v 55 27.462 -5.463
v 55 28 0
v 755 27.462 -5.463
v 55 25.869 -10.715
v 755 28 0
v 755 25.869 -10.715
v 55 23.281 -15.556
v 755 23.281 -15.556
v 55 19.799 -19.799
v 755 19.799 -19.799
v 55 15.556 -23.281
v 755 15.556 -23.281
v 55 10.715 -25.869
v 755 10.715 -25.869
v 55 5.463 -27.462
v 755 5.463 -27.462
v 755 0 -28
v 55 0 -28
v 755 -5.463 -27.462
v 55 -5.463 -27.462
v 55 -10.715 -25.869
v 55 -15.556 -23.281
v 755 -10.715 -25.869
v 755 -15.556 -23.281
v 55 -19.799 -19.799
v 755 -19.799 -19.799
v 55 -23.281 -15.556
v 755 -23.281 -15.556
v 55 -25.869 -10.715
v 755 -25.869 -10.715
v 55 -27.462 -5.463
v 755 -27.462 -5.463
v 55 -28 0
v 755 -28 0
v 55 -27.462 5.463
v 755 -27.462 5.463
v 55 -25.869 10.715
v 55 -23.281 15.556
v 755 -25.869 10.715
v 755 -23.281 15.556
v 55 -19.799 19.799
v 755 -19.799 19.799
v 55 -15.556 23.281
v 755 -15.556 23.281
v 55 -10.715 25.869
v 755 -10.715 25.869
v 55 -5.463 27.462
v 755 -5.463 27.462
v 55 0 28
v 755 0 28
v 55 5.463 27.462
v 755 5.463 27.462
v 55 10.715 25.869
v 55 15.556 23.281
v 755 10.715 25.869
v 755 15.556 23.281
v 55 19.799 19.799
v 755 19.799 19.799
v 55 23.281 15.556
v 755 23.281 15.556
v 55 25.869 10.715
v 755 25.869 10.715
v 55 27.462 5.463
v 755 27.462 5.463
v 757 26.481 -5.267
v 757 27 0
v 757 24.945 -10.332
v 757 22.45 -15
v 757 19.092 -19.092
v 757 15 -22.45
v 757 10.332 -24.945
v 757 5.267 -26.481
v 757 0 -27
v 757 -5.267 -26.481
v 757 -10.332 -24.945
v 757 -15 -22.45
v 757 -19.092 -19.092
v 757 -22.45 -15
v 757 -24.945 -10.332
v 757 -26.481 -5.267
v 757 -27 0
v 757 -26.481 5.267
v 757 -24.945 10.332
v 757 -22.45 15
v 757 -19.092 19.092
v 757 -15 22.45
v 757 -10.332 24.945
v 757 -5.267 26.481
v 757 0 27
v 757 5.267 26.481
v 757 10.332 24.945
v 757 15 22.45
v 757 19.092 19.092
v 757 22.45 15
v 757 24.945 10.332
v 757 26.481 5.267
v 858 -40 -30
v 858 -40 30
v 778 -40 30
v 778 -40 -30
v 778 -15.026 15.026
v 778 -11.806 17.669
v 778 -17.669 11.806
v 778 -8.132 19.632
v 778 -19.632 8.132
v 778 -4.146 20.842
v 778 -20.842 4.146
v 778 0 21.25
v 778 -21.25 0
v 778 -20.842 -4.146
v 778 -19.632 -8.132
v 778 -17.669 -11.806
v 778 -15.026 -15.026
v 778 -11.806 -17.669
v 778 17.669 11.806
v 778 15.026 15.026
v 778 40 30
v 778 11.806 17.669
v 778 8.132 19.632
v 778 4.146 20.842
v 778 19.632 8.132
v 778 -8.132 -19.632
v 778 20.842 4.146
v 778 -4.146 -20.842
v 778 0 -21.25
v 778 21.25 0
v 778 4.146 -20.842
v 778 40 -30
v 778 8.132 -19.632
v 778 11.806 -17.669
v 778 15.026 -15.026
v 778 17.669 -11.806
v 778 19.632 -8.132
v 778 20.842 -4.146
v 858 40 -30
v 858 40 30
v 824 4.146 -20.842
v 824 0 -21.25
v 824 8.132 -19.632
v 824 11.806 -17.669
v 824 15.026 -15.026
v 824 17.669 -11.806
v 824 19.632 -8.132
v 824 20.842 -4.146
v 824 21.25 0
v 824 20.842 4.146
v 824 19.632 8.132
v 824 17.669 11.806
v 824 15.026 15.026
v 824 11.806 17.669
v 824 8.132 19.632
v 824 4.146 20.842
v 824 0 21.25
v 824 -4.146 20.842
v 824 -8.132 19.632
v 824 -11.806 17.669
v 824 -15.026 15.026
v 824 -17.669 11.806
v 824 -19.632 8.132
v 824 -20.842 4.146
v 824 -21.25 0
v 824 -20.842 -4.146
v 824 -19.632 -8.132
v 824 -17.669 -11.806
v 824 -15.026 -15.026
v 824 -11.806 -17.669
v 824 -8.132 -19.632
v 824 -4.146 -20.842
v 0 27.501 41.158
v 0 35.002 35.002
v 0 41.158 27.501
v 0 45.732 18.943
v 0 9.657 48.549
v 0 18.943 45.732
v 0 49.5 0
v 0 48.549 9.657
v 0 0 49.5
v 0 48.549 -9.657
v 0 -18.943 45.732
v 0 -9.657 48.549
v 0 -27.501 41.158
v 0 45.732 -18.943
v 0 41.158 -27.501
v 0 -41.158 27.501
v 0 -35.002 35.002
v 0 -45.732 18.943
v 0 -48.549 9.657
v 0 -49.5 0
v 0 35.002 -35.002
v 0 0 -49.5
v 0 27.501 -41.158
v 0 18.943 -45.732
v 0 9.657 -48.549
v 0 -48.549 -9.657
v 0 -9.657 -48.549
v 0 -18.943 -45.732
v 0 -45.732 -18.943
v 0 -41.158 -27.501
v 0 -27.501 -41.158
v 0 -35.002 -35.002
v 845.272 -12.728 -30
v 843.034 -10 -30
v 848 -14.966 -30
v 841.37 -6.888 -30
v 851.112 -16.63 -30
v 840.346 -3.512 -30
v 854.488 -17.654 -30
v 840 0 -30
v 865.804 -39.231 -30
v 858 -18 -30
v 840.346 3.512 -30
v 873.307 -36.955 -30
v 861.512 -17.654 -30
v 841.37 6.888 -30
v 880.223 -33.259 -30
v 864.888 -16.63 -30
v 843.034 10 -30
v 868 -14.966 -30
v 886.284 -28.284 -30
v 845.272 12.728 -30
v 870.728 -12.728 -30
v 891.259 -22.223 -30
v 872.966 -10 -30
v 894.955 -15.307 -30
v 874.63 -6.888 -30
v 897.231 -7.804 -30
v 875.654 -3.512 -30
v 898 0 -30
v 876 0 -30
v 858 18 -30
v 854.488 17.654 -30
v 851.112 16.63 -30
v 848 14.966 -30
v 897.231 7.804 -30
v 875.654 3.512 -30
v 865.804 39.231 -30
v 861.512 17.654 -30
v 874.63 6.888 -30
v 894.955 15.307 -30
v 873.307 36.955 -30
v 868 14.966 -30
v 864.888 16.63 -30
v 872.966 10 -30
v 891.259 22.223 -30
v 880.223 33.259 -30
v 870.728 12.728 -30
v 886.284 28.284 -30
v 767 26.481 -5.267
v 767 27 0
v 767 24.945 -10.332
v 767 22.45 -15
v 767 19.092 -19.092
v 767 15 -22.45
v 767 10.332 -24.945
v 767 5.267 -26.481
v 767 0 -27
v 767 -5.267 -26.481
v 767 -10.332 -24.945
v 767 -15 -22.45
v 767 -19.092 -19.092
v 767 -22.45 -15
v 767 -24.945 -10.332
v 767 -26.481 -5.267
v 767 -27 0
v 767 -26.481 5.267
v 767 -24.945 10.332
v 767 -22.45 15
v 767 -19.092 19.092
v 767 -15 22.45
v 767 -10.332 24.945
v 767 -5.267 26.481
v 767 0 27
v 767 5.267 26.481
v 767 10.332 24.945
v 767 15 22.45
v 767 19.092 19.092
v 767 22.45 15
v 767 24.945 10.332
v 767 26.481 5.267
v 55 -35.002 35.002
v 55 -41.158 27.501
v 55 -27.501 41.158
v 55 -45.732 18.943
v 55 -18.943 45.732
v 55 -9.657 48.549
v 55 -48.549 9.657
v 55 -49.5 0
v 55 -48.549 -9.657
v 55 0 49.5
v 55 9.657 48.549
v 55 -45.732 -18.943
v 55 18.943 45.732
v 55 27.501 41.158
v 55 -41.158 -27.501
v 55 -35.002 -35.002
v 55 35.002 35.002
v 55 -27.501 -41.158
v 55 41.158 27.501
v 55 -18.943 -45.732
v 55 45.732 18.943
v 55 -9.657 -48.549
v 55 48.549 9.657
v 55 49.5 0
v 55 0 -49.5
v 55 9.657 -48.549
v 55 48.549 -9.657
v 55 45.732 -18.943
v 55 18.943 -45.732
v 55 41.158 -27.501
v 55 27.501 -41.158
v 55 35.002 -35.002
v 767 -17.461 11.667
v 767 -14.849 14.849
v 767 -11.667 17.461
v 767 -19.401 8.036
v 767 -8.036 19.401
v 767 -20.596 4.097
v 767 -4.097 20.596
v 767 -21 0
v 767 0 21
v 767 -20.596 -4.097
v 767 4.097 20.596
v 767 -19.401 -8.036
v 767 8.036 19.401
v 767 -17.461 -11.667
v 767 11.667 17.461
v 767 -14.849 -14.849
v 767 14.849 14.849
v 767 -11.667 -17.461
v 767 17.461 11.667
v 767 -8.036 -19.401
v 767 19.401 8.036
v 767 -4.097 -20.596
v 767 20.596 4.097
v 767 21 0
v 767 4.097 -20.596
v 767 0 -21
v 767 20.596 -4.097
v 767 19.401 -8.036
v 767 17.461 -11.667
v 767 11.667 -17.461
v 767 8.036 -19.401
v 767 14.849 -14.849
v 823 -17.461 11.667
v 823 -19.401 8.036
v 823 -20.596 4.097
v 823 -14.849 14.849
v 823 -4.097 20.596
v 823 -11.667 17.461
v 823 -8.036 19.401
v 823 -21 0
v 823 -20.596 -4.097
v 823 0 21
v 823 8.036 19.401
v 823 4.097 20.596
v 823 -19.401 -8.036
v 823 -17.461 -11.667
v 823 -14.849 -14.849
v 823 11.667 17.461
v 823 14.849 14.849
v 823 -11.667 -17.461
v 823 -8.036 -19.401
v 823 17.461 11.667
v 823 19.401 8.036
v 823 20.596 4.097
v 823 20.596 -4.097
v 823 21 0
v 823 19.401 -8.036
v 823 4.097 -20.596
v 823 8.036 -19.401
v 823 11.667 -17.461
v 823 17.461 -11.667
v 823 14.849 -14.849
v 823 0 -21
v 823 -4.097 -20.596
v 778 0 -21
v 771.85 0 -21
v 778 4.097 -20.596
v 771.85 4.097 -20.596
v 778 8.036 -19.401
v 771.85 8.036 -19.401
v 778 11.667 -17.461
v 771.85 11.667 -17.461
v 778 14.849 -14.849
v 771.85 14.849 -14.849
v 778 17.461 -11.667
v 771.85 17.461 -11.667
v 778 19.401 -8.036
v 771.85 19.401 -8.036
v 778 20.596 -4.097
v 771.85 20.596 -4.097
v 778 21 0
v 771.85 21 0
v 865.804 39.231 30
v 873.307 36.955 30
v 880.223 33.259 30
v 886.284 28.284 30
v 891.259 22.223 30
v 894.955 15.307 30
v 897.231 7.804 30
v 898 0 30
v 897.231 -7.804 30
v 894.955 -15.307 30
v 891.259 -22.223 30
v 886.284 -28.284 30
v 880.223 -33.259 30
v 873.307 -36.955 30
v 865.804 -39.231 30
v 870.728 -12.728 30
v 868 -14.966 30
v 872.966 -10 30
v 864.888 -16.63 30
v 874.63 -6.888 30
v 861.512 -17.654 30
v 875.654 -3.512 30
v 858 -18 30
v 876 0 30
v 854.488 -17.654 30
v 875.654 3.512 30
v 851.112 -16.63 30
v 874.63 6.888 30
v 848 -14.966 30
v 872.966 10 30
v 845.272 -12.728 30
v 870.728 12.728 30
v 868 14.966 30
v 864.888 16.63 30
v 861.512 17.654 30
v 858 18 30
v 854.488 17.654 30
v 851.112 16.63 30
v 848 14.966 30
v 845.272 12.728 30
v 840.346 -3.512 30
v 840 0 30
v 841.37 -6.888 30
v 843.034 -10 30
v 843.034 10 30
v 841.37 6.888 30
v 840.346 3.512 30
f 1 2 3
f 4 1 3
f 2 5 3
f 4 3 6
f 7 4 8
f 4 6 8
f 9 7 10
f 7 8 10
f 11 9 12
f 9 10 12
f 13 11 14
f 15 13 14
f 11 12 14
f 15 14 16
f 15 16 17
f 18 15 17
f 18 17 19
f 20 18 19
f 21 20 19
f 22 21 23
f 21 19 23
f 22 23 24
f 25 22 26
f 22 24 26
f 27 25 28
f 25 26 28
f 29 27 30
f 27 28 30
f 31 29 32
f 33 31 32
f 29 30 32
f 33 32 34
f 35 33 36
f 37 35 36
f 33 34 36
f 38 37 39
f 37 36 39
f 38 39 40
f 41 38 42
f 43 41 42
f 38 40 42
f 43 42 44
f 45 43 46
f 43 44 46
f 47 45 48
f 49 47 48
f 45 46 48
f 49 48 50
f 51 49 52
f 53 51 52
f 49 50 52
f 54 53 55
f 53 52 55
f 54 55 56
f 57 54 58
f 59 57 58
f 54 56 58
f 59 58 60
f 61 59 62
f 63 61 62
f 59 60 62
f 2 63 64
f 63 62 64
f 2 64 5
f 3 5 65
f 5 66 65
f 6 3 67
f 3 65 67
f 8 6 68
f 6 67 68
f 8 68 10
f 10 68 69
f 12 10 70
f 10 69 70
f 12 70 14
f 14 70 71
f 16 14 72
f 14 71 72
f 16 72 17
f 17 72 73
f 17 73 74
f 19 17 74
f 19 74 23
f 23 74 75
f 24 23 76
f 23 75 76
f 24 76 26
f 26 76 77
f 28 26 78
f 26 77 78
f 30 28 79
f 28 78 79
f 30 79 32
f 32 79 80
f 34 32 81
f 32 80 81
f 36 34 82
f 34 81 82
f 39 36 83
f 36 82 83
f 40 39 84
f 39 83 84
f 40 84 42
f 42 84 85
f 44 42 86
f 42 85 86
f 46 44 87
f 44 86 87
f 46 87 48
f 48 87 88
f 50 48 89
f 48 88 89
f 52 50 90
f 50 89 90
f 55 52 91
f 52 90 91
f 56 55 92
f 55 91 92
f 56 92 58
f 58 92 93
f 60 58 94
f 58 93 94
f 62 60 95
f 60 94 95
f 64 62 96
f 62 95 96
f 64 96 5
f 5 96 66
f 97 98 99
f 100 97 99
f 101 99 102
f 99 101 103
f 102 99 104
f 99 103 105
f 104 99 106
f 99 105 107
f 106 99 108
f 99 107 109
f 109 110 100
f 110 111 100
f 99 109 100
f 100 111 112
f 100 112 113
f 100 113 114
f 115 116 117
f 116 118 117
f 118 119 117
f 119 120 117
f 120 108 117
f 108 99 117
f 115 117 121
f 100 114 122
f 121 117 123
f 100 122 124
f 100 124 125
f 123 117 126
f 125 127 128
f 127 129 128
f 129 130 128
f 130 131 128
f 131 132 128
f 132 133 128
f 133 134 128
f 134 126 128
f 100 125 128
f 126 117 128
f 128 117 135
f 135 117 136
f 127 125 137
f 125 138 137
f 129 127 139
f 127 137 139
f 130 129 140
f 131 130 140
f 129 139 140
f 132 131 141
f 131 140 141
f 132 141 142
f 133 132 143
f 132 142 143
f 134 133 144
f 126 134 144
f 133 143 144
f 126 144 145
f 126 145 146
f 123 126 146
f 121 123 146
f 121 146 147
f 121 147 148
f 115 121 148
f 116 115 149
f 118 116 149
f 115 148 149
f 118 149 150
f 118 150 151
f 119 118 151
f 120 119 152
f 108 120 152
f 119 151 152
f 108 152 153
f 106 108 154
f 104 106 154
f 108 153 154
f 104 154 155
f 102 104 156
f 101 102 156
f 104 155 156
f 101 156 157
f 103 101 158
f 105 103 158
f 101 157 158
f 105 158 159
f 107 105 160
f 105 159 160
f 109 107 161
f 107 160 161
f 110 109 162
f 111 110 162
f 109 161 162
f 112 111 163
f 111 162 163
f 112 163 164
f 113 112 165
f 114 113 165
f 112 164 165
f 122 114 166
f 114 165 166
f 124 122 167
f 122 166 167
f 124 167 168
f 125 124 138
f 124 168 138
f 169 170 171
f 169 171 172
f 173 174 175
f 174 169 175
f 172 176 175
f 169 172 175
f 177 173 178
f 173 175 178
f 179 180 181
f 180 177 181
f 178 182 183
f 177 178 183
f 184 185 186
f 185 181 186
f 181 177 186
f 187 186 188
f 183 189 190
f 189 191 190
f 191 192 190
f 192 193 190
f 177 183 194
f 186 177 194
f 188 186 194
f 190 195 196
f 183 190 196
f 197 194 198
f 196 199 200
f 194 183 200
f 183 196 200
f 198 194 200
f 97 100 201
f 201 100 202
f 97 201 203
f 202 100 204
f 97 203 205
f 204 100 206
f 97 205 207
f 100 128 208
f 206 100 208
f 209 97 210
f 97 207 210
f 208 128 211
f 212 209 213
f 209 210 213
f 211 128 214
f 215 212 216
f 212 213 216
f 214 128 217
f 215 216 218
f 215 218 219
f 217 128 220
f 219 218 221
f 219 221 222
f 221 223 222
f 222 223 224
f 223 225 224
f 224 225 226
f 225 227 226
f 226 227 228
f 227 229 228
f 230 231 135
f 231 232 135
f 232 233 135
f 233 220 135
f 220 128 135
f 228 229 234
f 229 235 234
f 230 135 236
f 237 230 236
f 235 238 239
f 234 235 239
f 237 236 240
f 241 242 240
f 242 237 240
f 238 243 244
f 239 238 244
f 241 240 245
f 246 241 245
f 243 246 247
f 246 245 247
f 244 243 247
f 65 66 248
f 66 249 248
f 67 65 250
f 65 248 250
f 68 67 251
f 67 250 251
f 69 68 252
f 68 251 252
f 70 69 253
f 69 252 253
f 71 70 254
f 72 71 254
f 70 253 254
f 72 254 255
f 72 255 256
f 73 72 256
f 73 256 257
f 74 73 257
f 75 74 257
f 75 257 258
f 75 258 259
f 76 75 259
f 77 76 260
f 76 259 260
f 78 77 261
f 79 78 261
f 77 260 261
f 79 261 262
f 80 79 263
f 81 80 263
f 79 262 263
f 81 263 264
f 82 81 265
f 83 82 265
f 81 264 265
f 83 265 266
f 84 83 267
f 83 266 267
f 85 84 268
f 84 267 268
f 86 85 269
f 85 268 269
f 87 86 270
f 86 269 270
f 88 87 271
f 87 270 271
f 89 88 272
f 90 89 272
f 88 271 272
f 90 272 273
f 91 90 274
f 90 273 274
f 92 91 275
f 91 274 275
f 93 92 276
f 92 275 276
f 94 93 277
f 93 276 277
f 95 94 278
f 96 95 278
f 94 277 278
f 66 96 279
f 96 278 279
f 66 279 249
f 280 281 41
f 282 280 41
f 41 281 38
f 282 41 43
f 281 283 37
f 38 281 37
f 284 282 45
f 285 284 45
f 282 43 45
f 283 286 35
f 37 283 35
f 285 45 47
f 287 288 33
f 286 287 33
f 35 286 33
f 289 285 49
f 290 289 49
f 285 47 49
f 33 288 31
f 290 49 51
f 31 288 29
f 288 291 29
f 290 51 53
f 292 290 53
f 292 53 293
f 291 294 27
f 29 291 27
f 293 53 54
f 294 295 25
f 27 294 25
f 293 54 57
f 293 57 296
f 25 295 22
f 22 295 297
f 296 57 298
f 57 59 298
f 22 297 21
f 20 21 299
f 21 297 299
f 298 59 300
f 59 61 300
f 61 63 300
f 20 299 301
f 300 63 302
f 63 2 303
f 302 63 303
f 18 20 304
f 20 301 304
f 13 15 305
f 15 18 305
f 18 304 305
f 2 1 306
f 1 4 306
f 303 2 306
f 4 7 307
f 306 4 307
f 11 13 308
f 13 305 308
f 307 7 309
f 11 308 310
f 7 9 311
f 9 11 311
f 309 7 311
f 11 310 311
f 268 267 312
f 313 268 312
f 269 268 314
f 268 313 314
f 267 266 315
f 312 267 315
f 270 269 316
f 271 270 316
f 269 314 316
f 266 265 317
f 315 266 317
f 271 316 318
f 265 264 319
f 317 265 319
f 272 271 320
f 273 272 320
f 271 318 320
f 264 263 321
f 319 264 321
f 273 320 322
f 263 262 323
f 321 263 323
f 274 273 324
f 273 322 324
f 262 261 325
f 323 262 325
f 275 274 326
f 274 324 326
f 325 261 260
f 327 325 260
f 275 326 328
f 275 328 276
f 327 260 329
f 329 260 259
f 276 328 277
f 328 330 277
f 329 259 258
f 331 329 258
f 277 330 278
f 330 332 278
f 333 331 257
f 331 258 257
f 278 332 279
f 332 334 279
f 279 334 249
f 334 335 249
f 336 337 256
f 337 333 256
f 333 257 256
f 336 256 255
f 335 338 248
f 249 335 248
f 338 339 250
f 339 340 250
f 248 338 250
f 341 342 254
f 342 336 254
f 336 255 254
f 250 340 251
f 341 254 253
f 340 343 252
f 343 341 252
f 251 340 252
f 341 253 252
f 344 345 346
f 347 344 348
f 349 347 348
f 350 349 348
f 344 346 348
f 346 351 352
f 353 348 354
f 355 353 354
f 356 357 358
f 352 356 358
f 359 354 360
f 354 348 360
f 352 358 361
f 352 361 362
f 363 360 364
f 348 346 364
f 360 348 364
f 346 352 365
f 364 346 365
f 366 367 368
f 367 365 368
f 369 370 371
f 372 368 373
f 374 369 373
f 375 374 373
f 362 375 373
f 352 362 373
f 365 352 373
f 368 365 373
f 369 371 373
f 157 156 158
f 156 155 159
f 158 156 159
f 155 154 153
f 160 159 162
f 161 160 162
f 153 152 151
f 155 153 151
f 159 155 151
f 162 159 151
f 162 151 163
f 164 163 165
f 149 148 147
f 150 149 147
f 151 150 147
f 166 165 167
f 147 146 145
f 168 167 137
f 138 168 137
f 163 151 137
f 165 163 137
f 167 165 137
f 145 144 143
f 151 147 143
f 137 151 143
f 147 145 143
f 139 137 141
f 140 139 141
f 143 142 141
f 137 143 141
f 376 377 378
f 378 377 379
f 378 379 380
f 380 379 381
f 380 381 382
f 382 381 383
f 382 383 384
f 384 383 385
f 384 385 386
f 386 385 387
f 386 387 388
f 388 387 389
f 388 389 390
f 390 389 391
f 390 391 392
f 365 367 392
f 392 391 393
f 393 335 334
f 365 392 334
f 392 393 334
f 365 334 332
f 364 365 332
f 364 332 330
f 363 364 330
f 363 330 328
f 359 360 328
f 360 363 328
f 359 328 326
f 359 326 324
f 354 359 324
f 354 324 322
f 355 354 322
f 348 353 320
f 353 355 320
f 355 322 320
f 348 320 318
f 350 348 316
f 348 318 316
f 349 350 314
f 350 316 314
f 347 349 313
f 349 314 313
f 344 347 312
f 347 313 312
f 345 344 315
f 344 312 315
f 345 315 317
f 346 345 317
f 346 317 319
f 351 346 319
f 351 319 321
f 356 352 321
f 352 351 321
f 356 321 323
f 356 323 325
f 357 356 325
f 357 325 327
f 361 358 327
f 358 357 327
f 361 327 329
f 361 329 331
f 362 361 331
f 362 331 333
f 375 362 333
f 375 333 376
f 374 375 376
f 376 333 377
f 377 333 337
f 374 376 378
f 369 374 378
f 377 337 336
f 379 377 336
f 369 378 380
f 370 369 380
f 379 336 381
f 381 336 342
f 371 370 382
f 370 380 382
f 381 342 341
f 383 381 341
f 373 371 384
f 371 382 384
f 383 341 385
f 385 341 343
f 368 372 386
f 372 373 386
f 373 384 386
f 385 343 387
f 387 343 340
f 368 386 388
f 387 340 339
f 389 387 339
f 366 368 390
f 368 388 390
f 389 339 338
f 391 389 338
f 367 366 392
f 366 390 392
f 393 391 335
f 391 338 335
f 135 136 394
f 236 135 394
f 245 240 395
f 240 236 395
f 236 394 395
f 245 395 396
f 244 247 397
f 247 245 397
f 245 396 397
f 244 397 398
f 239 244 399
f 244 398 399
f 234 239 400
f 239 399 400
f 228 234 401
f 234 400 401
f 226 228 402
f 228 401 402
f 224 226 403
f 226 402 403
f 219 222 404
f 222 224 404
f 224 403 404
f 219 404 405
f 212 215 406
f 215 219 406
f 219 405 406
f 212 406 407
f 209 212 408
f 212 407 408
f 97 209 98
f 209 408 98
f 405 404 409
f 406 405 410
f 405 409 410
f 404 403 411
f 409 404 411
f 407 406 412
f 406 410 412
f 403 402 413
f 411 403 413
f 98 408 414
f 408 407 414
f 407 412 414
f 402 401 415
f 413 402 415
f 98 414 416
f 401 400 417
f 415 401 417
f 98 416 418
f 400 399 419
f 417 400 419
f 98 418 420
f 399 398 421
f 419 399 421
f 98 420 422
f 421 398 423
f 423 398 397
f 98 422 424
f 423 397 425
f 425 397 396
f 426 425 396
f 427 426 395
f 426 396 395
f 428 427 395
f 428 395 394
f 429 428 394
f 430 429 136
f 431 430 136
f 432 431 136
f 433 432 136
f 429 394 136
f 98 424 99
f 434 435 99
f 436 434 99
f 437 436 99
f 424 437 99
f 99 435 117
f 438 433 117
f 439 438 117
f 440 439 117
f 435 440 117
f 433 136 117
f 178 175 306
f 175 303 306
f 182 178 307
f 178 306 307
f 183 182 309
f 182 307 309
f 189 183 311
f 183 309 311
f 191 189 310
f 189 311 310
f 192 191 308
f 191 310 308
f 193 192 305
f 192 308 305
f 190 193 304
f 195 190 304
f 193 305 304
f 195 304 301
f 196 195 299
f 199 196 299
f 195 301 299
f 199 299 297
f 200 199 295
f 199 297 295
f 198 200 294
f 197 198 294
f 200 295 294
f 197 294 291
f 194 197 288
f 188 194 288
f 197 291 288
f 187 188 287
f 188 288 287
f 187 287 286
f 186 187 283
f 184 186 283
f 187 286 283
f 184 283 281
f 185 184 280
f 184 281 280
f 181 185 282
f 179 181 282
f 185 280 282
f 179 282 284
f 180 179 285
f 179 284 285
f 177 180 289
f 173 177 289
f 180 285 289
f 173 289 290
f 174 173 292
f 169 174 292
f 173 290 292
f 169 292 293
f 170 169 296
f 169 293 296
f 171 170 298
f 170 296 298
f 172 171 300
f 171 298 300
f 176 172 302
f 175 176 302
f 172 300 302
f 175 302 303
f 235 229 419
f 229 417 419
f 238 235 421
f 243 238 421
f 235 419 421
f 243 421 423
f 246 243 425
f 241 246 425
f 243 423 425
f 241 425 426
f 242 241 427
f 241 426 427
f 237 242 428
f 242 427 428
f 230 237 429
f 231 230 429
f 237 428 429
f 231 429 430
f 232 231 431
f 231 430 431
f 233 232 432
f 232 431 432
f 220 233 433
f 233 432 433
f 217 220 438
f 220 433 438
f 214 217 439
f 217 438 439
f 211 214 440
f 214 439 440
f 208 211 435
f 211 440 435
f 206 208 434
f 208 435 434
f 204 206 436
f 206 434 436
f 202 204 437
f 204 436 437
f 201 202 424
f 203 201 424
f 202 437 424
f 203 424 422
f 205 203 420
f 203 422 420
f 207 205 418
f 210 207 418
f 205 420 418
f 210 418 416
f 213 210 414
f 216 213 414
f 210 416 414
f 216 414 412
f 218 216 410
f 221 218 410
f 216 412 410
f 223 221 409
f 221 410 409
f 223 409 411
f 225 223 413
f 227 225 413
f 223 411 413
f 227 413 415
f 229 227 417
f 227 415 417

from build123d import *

# Parameters (mm, degrees)
ESBO_O2_R                     = 77.954078429
ESBO_O2_R_2                   = 21.25
RESSALTO_EXTRUS_O1_DEPTH      = 75
RESSALTO_EXTRUS_O1_DEPTH_BACK = 45
ESBO_O4_R                     = 21.25
RESSALTO_EXTRUS_O3_DEPTH      = 74
ESBO_O5_W                     = 132.299972888
ESBO_O5_H                     = 165.7142615
ESBO_O5_R                     = 18
CORTE_EXTRUS_O1_DEPTH         = 78.954078429
CORTE_EXTRUS_O1_DEPTH_BACK    = 78.954078429
ESBO_O6_W                     = 80
ESBO_O6_H                     = 36.909179817
CORTE_EXTRUS_O2_DEPTH         = 10.5
CORTE_EXTRUS_O2_DEPTH_BACK    = 90.5
ESBO_O7_R                     = 21
RESSALTO_EXTRUS_O4_DEPTH      = 20


with BuildPart() as part:
    # Esboço1 → Revolução1 (revolve)
    with BuildSketch(Plane.XY):
        Polygon((0, 0), (0, 49.5), (55, 49.5), (55, 28), (755, 28), (757, 27), (767, 27), (767, 21), (823, 21), (823, 0), align=None)
    revolve(axis=Axis((823, 0, 0), (-1, 0, 0)))


with BuildPart() as body_2:
    # Esboço2 → Ressalto-extrusão1 (new body, two sides)
    with BuildSketch(Plane(origin=(823, 0, 0), x_dir=(0, 0, -1), z_dir=(1, 0, 0))) as ressalto_extrus_o1_sk:
        Circle(ESBO_O2_R)
        Circle(ESBO_O2_R_2, mode=Mode.SUBTRACT)
    extrude(amount=RESSALTO_EXTRUS_O1_DEPTH)
    extrude(ressalto_extrus_o1_sk.sketch, amount=-RESSALTO_EXTRUS_O1_DEPTH_BACK)

    # Esboço4 → Ressalto-extrusão3 (add)
    with BuildSketch(Plane(origin=(898, 0, 0), x_dir=(0, 0, -1), z_dir=(1, 0, 0))):
        Circle(ESBO_O4_R)
    extrude(amount=-RESSALTO_EXTRUS_O3_DEPTH)


with BuildPart() as corte_extrus_o1_tool:
    # Esboço5 → Corte-extrusão1 (new body, two sides)
    with BuildSketch(Plane.XY) as corte_extrus_o1_sk:
        with Locations((838, 0)):
            Rectangle(ESBO_O5_W, ESBO_O5_H)
        with BuildLine():
            Line((778, 40), (858, 40))
            ThreePointArc((858, 40), (886.284271247, 28.284271247), (898, 0))
            ThreePointArc((898, 0), (886.284271247, -28.284271247), (858, -40))
            Line((858, -40), (778, -40))
            Line((778, -40), (778, 40))
        make_face(mode=Mode.SUBTRACT)
        with Locations((858, 0)):
            Circle(ESBO_O5_R)
    extrude(amount=CORTE_EXTRUS_O1_DEPTH)
    extrude(corte_extrus_o1_sk.sketch, amount=-CORTE_EXTRUS_O1_DEPTH_BACK)


with BuildPart() as part_1:
    add(part.part)

    # Corte-extrusão1: cut by corte_extrus_o1_tool
    add(corte_extrus_o1_tool.part, mode=Mode.SUBTRACT)

    # Esboço7 → Ressalto-extrusão4 (add)
    with BuildSketch(Plane(origin=(771.850013556, 0, 0), x_dir=(0, 0, -1), z_dir=(1, 0, 0))):
        Circle(ESBO_O7_R)
    extrude(amount=RESSALTO_EXTRUS_O4_DEPTH)


with BuildPart() as body_2_1:
    add(body_2.part)

    # Corte-extrusão1: cut by corte_extrus_o1_tool
    add(corte_extrus_o1_tool.part, mode=Mode.SUBTRACT)

    # Esboço6 → Corte-extrusão2 (cut, two sides)
    with BuildSketch(Plane(origin=(0, 40, 0), x_dir=(1, 0, 0), z_dir=(0, 1, 0))) as corte_extrus_o2_sk:
        Polygon((773.594508965, 104.877127038), (773.594508965, 30), (778, 30), (778, 66.909179817), (858, 66.909179817), (858, 30), (942.405491035, 30), (942.405491035, 104.877127038), align=None)
        with Locations((818, 48.454589909)):
            Rectangle(ESBO_O6_W, ESBO_O6_H)
        Polygon((778, -30), (773.594508965, -30), (773.594508965, -104.877127038), (942.405491035, -104.877127038), (942.405491035, -30), (858, -30), (858, -66.909179817), (778, -66.909179817), align=None)
        with Locations((818, -48.454589909)):
            Rectangle(ESBO_O6_W, ESBO_O6_H)
    extrude(amount=CORTE_EXTRUS_O2_DEPTH, mode=Mode.SUBTRACT)
    extrude(corte_extrus_o2_sk.sketch, amount=-CORTE_EXTRUS_O2_DEPTH_BACK, mode=Mode.SUBTRACT)


solid = Compound([part_1.part, body_2_1.part])
